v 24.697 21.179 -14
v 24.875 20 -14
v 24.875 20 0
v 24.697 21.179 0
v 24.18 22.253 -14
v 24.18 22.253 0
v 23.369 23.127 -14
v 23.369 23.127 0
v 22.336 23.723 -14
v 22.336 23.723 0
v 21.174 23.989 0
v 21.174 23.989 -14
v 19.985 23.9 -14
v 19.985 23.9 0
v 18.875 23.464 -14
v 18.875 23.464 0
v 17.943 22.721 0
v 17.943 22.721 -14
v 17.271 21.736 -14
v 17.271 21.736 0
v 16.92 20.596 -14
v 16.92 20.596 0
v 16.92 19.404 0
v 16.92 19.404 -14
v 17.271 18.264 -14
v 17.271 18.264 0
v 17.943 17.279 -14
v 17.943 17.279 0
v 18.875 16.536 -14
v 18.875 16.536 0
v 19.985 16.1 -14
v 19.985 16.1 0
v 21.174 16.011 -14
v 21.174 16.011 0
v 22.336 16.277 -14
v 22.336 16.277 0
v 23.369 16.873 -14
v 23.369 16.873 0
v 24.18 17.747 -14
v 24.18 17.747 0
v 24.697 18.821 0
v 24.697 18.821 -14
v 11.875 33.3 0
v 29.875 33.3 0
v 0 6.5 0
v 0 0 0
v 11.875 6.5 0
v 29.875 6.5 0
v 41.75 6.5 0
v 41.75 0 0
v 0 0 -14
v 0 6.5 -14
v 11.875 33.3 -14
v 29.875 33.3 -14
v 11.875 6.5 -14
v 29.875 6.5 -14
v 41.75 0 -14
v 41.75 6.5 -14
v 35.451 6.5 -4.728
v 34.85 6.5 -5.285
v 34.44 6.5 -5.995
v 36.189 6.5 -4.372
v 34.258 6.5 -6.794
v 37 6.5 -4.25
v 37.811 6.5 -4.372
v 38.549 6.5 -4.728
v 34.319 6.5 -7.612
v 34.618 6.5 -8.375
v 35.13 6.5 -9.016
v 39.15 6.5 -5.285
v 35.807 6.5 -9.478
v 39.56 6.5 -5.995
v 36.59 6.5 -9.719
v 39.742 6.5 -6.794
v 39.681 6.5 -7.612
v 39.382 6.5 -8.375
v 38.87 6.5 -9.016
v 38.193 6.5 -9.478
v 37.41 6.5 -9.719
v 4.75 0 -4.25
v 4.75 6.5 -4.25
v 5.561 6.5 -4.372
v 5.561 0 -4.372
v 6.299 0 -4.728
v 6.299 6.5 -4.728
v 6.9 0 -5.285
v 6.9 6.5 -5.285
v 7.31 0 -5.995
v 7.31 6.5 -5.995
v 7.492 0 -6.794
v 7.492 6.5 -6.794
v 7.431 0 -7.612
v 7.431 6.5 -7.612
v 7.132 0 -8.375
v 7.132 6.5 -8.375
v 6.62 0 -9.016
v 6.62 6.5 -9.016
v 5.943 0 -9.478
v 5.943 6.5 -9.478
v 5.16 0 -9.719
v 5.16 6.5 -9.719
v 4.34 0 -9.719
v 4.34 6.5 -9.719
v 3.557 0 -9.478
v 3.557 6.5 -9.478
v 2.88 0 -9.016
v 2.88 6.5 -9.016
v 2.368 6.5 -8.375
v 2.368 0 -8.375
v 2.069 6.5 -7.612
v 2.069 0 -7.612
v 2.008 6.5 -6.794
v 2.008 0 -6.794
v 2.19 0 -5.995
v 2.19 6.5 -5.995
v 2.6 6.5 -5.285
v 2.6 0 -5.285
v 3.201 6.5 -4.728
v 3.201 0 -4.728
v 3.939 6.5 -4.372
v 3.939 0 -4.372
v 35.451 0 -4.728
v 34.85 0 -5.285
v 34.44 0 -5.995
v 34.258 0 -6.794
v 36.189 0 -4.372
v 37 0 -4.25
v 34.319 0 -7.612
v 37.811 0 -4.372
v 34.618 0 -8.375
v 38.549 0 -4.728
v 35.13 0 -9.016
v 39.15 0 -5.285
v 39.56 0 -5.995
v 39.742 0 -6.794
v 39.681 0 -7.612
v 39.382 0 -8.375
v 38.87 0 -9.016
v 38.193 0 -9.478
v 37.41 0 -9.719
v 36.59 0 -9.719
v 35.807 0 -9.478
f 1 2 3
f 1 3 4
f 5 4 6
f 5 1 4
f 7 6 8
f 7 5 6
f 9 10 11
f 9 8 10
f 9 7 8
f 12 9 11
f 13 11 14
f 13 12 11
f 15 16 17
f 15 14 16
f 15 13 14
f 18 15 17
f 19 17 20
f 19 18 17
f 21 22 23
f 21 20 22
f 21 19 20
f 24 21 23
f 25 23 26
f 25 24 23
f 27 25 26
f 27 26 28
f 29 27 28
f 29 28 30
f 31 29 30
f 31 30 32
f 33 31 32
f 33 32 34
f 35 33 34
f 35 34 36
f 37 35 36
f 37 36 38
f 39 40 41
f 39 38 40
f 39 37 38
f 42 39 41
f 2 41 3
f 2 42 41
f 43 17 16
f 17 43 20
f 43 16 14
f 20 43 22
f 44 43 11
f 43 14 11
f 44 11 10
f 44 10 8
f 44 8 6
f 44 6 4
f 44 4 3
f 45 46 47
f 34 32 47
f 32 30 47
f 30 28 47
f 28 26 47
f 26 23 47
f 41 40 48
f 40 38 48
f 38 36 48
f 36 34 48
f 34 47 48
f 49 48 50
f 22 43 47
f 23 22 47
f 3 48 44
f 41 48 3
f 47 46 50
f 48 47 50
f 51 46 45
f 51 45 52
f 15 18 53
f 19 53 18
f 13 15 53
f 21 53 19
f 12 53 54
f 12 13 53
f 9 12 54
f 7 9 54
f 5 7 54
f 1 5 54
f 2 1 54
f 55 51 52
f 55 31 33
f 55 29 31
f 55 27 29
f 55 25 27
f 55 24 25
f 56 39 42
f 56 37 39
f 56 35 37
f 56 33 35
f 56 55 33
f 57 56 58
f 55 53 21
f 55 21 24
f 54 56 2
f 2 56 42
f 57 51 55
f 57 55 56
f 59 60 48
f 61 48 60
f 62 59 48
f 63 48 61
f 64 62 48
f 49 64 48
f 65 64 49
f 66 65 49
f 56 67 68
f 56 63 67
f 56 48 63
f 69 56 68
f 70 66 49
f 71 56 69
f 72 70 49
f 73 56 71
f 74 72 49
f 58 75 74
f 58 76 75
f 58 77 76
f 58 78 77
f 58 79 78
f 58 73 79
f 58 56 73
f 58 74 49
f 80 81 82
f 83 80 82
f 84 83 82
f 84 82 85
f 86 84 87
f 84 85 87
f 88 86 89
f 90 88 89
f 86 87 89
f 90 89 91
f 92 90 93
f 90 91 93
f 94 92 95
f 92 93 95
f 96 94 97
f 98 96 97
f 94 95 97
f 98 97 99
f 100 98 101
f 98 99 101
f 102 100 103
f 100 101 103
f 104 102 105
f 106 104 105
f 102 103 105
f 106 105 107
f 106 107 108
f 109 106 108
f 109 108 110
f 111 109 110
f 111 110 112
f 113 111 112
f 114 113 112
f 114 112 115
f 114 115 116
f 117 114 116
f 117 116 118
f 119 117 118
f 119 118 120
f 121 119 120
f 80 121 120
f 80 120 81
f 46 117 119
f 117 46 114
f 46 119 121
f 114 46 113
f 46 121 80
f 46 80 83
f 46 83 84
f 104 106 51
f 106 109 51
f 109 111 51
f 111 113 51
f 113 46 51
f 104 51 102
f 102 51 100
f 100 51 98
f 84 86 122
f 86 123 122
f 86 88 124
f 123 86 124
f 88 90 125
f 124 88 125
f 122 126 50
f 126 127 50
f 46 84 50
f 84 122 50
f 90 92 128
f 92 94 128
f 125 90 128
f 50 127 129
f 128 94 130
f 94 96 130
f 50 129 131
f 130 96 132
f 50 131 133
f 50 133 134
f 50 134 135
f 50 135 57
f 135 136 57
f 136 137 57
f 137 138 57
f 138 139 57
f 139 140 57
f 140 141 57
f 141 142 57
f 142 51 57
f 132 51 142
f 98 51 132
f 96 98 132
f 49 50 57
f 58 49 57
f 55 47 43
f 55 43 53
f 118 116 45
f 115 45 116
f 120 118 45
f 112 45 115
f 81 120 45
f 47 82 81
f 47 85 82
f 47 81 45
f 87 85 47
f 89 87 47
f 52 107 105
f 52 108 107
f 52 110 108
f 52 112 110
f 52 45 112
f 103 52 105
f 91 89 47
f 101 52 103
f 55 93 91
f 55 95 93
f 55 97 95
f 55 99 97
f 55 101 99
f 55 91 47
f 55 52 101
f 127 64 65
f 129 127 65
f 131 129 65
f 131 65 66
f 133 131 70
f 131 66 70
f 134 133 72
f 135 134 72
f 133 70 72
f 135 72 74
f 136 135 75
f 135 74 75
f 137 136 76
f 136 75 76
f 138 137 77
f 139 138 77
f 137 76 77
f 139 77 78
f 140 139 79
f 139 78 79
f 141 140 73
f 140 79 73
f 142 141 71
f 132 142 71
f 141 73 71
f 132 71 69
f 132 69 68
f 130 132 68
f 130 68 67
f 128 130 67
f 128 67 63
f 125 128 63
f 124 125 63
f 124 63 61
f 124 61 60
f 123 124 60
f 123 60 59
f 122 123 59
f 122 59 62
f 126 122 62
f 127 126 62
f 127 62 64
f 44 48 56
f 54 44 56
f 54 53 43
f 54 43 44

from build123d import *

# Parameters (mm, degrees)
SKETCH1_W               = 41.75
SKETCH1_H               = 14
BOSS_EXTRUDE1_DEPTH     = 6.5
SKETCH2_W               = 18
SKETCH2_H               = 14
BOSS_EXTRUDE2_DEPTH     = 26.8
CUT_EXTRUDE1_DEPTH      = 56.20826478
CUT_EXTRUDE1_DEPTH_BACK = 56.20826478
SKETCH3_R               = 4
SKETCH4_R               = 2.75
CUT_EXTRUDE2_DEPTH      = 52.549030059


with BuildPart() as part:
    # Sketch1 → Boss-Extrude1 (new body)
    with BuildSketch(Plane(origin=(0, 0, 0), x_dir=(1, 0, 0), z_dir=(0, 1, 0))):
        with Locations((20.875, 7)):
            Rectangle(SKETCH1_W, SKETCH1_H)
    extrude(amount=BOSS_EXTRUDE1_DEPTH)

    # Sketch2 → Boss-Extrude2 (add)
    with BuildSketch(Plane(origin=(0, 6.5, 0), x_dir=(1, 0, 0), z_dir=(0, 1, 0))):
        with Locations((20.875, 7)):
            Rectangle(SKETCH2_W, SKETCH2_H)
    extrude(amount=BOSS_EXTRUDE2_DEPTH)

    # Sketch3 → Cut-Extrude1 (cut, two sides: drawn at the far end of the back side and taken through both)
    with BuildSketch(Plane.XY.offset(-CUT_EXTRUDE1_DEPTH_BACK)):
        with Locations((20.875, 20)):
            Circle(SKETCH3_R)
    extrude(amount=CUT_EXTRUDE1_DEPTH + CUT_EXTRUDE1_DEPTH_BACK, mode=Mode.SUBTRACT)

    # Sketch4 → Cut-Extrude2 (cut, through all)
    with BuildSketch(Plane(origin=(0, 6.5, 0), x_dir=(1, 0, 0), z_dir=(0, 1, 0))):
        with Locations(Location((37, 7, 0), (0, 0, 270))):
            Circle(SKETCH4_R)
        with Locations(Location((4.75, 7, 0), (0, 0, 270))):
            Circle(SKETCH4_R)
    extrude(amount=-CUT_EXTRUDE2_DEPTH, mode=Mode.SUBTRACT)


solid = part.part
